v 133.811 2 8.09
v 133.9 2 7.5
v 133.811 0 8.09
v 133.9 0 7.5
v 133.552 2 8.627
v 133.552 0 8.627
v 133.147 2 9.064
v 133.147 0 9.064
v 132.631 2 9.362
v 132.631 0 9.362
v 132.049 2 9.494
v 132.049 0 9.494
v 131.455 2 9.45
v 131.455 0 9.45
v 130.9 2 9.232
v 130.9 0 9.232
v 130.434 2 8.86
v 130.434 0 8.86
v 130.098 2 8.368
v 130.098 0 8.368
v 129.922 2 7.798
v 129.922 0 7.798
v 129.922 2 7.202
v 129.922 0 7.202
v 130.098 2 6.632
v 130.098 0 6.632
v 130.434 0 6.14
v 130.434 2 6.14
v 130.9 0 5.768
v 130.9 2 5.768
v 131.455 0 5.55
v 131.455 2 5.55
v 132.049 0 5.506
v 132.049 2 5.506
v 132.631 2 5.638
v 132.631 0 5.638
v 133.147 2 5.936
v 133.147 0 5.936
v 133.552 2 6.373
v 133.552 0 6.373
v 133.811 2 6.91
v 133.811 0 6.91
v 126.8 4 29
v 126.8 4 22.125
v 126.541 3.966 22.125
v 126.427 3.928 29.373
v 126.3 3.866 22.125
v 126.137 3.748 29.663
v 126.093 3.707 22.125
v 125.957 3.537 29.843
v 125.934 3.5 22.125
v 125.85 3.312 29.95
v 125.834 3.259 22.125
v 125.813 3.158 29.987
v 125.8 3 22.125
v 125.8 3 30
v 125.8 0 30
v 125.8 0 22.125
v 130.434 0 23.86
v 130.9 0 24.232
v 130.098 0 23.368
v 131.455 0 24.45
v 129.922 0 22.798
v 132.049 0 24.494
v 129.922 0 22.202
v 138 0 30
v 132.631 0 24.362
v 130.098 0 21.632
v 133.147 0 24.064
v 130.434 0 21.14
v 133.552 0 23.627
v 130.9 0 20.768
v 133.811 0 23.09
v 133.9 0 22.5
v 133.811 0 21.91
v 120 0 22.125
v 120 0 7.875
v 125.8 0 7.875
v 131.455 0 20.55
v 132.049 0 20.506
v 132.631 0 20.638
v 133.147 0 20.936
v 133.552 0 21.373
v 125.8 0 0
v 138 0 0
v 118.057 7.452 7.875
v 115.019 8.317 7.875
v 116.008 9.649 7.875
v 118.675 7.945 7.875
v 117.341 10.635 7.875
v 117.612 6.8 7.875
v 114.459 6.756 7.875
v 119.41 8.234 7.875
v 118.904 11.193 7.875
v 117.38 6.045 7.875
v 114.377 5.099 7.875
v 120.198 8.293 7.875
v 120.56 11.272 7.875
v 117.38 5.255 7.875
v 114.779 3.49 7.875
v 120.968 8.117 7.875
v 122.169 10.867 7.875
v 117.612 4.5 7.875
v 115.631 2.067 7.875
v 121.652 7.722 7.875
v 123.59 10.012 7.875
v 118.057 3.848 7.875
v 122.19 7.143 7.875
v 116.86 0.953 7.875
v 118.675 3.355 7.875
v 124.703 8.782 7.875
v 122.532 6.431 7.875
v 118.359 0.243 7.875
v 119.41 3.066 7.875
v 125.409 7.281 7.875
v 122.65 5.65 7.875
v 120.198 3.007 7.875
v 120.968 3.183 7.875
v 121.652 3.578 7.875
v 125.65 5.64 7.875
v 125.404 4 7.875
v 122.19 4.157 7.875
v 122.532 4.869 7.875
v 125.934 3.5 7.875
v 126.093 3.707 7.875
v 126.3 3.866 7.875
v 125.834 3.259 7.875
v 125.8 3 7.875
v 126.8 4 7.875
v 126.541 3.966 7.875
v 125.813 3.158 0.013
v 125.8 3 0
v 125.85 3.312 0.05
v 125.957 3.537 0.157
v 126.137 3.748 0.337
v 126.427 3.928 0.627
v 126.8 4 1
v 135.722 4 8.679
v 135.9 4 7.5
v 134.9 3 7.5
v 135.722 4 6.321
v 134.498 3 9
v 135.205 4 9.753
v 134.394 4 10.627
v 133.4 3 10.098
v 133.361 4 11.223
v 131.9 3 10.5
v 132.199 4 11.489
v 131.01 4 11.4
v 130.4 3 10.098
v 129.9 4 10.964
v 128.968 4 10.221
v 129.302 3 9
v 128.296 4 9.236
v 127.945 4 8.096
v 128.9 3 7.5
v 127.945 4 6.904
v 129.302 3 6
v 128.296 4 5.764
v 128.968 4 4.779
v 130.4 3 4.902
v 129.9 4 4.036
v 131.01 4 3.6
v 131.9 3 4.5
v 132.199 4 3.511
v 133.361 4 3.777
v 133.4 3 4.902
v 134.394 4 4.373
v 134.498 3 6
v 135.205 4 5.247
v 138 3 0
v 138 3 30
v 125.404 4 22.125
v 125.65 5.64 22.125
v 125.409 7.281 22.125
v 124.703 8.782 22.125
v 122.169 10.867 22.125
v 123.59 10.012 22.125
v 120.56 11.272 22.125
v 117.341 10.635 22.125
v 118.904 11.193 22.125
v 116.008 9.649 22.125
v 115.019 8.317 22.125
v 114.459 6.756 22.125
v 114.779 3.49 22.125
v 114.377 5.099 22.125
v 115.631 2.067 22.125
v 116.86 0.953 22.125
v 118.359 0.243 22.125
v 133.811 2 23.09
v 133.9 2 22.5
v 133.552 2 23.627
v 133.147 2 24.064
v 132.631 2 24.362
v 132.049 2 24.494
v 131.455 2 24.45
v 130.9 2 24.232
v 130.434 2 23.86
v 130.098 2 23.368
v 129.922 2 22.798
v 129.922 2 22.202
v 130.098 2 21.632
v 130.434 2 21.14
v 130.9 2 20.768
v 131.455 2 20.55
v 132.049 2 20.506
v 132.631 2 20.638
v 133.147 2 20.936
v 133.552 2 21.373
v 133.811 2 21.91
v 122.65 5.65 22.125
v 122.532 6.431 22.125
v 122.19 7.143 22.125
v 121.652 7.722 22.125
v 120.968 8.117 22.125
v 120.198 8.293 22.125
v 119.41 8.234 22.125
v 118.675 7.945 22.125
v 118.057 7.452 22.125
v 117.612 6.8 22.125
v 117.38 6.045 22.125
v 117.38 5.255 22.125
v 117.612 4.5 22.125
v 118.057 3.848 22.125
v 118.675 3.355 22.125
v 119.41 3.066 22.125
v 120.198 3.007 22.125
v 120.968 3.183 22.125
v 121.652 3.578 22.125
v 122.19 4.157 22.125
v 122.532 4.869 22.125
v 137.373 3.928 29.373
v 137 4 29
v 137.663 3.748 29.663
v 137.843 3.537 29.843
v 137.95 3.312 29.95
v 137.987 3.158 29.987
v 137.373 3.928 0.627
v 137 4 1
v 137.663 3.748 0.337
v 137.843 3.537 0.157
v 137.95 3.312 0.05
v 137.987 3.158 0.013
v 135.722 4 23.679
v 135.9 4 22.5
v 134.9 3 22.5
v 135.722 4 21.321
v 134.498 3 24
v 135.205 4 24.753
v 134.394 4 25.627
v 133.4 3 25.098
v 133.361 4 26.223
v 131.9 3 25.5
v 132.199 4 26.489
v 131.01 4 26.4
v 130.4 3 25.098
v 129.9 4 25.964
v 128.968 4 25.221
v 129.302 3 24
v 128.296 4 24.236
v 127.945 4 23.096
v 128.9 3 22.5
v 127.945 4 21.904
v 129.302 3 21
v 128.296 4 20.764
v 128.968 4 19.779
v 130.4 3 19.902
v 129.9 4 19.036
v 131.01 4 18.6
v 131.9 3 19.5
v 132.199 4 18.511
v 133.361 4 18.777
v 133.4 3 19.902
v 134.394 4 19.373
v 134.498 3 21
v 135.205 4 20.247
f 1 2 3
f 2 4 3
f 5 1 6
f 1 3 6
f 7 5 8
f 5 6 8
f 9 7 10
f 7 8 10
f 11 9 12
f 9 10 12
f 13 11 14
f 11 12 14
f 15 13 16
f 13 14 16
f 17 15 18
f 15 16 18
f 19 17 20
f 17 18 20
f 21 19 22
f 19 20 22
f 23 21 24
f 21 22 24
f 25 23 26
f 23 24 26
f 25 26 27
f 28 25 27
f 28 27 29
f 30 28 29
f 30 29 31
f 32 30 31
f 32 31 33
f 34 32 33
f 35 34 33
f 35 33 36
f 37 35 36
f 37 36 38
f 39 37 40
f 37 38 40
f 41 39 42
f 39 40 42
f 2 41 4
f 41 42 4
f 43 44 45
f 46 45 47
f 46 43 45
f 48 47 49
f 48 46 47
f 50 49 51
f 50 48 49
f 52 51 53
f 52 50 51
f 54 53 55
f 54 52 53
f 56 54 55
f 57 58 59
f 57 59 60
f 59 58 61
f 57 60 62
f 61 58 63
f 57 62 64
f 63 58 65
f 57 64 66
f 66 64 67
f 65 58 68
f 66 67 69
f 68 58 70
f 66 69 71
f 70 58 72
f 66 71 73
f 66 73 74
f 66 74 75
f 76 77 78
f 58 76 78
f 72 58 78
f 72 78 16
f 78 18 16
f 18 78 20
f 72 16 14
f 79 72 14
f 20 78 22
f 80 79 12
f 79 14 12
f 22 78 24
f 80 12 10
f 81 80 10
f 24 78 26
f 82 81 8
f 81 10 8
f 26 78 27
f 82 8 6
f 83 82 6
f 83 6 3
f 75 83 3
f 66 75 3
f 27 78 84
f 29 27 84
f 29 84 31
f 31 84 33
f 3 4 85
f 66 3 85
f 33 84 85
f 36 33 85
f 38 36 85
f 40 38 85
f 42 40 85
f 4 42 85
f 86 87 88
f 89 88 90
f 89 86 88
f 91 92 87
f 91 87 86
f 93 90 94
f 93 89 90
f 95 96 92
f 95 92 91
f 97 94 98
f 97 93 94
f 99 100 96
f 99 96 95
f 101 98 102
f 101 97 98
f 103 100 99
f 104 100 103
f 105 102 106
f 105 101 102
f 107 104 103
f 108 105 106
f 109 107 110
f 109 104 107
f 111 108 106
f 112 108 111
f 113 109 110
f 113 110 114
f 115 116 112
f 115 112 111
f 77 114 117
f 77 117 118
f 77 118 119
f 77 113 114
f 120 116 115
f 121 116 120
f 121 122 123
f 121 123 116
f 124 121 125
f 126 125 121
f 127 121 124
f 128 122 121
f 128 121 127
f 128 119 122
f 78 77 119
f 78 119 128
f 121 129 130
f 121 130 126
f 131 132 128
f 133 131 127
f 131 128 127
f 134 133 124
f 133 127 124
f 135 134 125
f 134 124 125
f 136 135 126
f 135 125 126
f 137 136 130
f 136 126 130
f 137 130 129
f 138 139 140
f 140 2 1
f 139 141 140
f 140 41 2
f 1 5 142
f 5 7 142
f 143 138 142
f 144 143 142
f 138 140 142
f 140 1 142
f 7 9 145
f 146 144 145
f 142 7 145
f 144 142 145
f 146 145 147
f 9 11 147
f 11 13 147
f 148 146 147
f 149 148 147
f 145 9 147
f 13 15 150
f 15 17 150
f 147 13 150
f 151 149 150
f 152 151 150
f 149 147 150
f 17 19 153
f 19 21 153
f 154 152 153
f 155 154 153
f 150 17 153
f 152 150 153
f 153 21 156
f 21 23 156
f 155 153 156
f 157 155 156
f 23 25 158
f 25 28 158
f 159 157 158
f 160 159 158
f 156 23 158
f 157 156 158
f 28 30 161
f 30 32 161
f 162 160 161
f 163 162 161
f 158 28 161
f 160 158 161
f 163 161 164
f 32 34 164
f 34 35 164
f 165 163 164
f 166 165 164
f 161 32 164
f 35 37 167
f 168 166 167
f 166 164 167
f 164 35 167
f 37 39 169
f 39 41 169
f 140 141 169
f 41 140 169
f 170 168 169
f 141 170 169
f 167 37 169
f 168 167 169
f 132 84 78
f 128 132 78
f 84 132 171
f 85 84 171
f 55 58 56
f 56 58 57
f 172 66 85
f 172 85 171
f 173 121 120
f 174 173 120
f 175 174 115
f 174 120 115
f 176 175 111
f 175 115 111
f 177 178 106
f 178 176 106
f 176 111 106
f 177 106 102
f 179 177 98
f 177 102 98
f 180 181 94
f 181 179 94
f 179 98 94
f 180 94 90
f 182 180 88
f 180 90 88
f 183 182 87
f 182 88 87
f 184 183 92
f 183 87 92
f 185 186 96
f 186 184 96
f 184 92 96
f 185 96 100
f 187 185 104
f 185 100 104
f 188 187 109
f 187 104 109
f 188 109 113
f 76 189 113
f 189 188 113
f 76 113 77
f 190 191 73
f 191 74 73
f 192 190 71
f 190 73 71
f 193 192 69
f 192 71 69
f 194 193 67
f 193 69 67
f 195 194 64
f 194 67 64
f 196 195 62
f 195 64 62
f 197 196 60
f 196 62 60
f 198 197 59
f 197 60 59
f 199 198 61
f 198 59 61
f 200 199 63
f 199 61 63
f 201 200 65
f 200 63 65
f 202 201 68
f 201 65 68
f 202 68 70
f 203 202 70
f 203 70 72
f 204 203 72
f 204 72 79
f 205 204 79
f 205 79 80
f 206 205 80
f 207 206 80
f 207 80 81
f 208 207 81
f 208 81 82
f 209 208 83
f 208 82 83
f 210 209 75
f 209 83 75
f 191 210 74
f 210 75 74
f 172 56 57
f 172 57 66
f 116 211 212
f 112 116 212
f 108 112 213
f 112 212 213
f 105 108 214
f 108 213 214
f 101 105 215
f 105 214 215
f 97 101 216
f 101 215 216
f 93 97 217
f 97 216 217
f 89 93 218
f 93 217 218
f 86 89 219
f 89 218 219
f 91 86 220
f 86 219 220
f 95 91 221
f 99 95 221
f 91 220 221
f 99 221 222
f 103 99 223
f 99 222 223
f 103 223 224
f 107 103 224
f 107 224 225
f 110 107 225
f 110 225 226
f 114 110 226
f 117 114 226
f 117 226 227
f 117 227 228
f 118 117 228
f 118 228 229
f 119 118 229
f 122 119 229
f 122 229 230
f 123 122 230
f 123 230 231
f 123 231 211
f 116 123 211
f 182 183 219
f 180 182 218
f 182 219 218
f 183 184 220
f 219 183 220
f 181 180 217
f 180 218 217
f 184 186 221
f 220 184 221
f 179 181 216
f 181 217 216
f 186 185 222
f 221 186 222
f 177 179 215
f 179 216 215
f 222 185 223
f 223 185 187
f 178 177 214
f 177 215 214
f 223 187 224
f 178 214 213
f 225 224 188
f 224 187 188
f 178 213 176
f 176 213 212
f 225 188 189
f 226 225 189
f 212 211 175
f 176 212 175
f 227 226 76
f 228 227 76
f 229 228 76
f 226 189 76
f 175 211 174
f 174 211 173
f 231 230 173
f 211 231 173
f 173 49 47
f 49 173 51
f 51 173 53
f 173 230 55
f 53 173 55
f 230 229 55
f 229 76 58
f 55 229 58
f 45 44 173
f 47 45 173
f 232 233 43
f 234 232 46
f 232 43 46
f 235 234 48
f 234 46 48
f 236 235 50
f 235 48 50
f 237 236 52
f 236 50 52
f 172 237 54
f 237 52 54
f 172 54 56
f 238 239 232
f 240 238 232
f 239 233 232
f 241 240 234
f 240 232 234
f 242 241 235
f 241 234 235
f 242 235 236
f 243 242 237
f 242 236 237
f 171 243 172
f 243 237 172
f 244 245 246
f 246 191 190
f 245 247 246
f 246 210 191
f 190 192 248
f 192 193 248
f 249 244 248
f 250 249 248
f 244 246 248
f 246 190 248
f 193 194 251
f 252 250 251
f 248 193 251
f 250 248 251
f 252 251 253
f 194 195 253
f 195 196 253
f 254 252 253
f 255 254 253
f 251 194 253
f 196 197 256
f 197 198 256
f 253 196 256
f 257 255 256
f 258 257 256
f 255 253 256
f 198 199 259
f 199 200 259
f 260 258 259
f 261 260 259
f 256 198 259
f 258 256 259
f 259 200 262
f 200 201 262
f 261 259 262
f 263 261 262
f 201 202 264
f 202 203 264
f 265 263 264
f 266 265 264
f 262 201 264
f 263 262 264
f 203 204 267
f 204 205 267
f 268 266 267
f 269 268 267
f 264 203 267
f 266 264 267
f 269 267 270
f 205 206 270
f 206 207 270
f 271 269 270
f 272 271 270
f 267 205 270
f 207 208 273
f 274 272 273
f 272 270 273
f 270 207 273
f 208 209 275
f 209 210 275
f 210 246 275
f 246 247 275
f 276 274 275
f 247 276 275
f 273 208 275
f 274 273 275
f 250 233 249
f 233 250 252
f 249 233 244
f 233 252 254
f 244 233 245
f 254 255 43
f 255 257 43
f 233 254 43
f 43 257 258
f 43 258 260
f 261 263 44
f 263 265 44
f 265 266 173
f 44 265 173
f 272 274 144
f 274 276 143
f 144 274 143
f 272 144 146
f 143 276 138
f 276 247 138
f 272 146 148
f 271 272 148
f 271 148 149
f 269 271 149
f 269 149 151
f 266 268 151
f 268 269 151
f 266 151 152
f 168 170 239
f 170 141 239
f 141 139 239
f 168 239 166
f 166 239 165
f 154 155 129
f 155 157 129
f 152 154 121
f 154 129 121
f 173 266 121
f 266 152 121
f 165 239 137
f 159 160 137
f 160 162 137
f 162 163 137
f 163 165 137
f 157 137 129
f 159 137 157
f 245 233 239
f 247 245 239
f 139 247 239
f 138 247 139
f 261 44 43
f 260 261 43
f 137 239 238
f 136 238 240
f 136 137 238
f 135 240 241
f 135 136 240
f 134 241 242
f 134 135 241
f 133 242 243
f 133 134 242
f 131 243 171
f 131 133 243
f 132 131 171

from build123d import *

# Parameters (mm, degrees)
PAD001_DEPTH     = 30
SKETCH003_W      = 15
SKETCH003_H      = 15
POCKET001_DEPTH  = 11.301
SKETCH004_R      = 2.5
PAD002_DEPTH     = 30
HOLE_D           = 4
HOLE_CSINK_D     = 8
HOLE_CSINK_ANGLE = 90
SKETCH006_R      = 2.65
POCKET002_DEPTH  = 30.001
FILLET001_R      = 1


with BuildPart() as part:
    # Sketch002 → Pad001 (new body)
    with BuildSketch(Plane.XY):
        with BuildLine():
            Line((120, 0), (138, 0))
            Line((138, 0), (138, 4))
            Line((138, 4), (125.403702, 4))
            ThreePointArc((125.403702, 4), (116.638453, 10.1912), (120, 0))
        make_face()
    extrude(amount=PAD001_DEPTH)

    # Sketch003 (on Face1 of Pad001) → Pocket001 (cut, through all)
    with BuildSketch(Plane.XZ):
        with Locations((118.3, 29.625)):
            Rectangle(SKETCH003_W, SKETCH003_H)
        with Locations((118.3, 0.375)):
            Rectangle(SKETCH003_W, SKETCH003_H)
    extrude(amount=-POCKET001_DEPTH, mode=Mode.SUBTRACT)

    # Sketch004 → Pad002 (join)
    with BuildSketch(Plane.XY):
        with Locations((120, 5.65)):
            Circle(SKETCH004_R)
    extrude(amount=PAD002_DEPTH)

    # Hole (through all)
    with Locations(Plane(origin=(0, 4, 0), x_dir=(-1, 0, 0), z_dir=(0, 1, 0))):
        with Locations((-131.9, 22.5), (-131.9, 7.5)):
            CounterSinkHole(HOLE_D / 2, HOLE_CSINK_D / 2, counter_sink_angle=HOLE_CSINK_ANGLE)

    # Sketch006 → Pocket002 (cut, through all)
    with BuildSketch(Plane.XY.offset(30)):
        with Locations((120, 5.65)):
            Circle(SKETCH006_R)
    extrude(amount=-POCKET002_DEPTH, mode=Mode.SUBTRACT)

    # Fillet001
    fillet001_edges = [part.edges().sort_by_distance(p)[0] for p in [
        (138, 4, 15),
        (131.9, 4, 0),
        (125.8, 4, 3.9375),
        (125.8, 4, 26.0625),
        (131.9, 4, 30),
    ]]
    fillet(fillet001_edges, radius=FILLET001_R)


solid = part.part
